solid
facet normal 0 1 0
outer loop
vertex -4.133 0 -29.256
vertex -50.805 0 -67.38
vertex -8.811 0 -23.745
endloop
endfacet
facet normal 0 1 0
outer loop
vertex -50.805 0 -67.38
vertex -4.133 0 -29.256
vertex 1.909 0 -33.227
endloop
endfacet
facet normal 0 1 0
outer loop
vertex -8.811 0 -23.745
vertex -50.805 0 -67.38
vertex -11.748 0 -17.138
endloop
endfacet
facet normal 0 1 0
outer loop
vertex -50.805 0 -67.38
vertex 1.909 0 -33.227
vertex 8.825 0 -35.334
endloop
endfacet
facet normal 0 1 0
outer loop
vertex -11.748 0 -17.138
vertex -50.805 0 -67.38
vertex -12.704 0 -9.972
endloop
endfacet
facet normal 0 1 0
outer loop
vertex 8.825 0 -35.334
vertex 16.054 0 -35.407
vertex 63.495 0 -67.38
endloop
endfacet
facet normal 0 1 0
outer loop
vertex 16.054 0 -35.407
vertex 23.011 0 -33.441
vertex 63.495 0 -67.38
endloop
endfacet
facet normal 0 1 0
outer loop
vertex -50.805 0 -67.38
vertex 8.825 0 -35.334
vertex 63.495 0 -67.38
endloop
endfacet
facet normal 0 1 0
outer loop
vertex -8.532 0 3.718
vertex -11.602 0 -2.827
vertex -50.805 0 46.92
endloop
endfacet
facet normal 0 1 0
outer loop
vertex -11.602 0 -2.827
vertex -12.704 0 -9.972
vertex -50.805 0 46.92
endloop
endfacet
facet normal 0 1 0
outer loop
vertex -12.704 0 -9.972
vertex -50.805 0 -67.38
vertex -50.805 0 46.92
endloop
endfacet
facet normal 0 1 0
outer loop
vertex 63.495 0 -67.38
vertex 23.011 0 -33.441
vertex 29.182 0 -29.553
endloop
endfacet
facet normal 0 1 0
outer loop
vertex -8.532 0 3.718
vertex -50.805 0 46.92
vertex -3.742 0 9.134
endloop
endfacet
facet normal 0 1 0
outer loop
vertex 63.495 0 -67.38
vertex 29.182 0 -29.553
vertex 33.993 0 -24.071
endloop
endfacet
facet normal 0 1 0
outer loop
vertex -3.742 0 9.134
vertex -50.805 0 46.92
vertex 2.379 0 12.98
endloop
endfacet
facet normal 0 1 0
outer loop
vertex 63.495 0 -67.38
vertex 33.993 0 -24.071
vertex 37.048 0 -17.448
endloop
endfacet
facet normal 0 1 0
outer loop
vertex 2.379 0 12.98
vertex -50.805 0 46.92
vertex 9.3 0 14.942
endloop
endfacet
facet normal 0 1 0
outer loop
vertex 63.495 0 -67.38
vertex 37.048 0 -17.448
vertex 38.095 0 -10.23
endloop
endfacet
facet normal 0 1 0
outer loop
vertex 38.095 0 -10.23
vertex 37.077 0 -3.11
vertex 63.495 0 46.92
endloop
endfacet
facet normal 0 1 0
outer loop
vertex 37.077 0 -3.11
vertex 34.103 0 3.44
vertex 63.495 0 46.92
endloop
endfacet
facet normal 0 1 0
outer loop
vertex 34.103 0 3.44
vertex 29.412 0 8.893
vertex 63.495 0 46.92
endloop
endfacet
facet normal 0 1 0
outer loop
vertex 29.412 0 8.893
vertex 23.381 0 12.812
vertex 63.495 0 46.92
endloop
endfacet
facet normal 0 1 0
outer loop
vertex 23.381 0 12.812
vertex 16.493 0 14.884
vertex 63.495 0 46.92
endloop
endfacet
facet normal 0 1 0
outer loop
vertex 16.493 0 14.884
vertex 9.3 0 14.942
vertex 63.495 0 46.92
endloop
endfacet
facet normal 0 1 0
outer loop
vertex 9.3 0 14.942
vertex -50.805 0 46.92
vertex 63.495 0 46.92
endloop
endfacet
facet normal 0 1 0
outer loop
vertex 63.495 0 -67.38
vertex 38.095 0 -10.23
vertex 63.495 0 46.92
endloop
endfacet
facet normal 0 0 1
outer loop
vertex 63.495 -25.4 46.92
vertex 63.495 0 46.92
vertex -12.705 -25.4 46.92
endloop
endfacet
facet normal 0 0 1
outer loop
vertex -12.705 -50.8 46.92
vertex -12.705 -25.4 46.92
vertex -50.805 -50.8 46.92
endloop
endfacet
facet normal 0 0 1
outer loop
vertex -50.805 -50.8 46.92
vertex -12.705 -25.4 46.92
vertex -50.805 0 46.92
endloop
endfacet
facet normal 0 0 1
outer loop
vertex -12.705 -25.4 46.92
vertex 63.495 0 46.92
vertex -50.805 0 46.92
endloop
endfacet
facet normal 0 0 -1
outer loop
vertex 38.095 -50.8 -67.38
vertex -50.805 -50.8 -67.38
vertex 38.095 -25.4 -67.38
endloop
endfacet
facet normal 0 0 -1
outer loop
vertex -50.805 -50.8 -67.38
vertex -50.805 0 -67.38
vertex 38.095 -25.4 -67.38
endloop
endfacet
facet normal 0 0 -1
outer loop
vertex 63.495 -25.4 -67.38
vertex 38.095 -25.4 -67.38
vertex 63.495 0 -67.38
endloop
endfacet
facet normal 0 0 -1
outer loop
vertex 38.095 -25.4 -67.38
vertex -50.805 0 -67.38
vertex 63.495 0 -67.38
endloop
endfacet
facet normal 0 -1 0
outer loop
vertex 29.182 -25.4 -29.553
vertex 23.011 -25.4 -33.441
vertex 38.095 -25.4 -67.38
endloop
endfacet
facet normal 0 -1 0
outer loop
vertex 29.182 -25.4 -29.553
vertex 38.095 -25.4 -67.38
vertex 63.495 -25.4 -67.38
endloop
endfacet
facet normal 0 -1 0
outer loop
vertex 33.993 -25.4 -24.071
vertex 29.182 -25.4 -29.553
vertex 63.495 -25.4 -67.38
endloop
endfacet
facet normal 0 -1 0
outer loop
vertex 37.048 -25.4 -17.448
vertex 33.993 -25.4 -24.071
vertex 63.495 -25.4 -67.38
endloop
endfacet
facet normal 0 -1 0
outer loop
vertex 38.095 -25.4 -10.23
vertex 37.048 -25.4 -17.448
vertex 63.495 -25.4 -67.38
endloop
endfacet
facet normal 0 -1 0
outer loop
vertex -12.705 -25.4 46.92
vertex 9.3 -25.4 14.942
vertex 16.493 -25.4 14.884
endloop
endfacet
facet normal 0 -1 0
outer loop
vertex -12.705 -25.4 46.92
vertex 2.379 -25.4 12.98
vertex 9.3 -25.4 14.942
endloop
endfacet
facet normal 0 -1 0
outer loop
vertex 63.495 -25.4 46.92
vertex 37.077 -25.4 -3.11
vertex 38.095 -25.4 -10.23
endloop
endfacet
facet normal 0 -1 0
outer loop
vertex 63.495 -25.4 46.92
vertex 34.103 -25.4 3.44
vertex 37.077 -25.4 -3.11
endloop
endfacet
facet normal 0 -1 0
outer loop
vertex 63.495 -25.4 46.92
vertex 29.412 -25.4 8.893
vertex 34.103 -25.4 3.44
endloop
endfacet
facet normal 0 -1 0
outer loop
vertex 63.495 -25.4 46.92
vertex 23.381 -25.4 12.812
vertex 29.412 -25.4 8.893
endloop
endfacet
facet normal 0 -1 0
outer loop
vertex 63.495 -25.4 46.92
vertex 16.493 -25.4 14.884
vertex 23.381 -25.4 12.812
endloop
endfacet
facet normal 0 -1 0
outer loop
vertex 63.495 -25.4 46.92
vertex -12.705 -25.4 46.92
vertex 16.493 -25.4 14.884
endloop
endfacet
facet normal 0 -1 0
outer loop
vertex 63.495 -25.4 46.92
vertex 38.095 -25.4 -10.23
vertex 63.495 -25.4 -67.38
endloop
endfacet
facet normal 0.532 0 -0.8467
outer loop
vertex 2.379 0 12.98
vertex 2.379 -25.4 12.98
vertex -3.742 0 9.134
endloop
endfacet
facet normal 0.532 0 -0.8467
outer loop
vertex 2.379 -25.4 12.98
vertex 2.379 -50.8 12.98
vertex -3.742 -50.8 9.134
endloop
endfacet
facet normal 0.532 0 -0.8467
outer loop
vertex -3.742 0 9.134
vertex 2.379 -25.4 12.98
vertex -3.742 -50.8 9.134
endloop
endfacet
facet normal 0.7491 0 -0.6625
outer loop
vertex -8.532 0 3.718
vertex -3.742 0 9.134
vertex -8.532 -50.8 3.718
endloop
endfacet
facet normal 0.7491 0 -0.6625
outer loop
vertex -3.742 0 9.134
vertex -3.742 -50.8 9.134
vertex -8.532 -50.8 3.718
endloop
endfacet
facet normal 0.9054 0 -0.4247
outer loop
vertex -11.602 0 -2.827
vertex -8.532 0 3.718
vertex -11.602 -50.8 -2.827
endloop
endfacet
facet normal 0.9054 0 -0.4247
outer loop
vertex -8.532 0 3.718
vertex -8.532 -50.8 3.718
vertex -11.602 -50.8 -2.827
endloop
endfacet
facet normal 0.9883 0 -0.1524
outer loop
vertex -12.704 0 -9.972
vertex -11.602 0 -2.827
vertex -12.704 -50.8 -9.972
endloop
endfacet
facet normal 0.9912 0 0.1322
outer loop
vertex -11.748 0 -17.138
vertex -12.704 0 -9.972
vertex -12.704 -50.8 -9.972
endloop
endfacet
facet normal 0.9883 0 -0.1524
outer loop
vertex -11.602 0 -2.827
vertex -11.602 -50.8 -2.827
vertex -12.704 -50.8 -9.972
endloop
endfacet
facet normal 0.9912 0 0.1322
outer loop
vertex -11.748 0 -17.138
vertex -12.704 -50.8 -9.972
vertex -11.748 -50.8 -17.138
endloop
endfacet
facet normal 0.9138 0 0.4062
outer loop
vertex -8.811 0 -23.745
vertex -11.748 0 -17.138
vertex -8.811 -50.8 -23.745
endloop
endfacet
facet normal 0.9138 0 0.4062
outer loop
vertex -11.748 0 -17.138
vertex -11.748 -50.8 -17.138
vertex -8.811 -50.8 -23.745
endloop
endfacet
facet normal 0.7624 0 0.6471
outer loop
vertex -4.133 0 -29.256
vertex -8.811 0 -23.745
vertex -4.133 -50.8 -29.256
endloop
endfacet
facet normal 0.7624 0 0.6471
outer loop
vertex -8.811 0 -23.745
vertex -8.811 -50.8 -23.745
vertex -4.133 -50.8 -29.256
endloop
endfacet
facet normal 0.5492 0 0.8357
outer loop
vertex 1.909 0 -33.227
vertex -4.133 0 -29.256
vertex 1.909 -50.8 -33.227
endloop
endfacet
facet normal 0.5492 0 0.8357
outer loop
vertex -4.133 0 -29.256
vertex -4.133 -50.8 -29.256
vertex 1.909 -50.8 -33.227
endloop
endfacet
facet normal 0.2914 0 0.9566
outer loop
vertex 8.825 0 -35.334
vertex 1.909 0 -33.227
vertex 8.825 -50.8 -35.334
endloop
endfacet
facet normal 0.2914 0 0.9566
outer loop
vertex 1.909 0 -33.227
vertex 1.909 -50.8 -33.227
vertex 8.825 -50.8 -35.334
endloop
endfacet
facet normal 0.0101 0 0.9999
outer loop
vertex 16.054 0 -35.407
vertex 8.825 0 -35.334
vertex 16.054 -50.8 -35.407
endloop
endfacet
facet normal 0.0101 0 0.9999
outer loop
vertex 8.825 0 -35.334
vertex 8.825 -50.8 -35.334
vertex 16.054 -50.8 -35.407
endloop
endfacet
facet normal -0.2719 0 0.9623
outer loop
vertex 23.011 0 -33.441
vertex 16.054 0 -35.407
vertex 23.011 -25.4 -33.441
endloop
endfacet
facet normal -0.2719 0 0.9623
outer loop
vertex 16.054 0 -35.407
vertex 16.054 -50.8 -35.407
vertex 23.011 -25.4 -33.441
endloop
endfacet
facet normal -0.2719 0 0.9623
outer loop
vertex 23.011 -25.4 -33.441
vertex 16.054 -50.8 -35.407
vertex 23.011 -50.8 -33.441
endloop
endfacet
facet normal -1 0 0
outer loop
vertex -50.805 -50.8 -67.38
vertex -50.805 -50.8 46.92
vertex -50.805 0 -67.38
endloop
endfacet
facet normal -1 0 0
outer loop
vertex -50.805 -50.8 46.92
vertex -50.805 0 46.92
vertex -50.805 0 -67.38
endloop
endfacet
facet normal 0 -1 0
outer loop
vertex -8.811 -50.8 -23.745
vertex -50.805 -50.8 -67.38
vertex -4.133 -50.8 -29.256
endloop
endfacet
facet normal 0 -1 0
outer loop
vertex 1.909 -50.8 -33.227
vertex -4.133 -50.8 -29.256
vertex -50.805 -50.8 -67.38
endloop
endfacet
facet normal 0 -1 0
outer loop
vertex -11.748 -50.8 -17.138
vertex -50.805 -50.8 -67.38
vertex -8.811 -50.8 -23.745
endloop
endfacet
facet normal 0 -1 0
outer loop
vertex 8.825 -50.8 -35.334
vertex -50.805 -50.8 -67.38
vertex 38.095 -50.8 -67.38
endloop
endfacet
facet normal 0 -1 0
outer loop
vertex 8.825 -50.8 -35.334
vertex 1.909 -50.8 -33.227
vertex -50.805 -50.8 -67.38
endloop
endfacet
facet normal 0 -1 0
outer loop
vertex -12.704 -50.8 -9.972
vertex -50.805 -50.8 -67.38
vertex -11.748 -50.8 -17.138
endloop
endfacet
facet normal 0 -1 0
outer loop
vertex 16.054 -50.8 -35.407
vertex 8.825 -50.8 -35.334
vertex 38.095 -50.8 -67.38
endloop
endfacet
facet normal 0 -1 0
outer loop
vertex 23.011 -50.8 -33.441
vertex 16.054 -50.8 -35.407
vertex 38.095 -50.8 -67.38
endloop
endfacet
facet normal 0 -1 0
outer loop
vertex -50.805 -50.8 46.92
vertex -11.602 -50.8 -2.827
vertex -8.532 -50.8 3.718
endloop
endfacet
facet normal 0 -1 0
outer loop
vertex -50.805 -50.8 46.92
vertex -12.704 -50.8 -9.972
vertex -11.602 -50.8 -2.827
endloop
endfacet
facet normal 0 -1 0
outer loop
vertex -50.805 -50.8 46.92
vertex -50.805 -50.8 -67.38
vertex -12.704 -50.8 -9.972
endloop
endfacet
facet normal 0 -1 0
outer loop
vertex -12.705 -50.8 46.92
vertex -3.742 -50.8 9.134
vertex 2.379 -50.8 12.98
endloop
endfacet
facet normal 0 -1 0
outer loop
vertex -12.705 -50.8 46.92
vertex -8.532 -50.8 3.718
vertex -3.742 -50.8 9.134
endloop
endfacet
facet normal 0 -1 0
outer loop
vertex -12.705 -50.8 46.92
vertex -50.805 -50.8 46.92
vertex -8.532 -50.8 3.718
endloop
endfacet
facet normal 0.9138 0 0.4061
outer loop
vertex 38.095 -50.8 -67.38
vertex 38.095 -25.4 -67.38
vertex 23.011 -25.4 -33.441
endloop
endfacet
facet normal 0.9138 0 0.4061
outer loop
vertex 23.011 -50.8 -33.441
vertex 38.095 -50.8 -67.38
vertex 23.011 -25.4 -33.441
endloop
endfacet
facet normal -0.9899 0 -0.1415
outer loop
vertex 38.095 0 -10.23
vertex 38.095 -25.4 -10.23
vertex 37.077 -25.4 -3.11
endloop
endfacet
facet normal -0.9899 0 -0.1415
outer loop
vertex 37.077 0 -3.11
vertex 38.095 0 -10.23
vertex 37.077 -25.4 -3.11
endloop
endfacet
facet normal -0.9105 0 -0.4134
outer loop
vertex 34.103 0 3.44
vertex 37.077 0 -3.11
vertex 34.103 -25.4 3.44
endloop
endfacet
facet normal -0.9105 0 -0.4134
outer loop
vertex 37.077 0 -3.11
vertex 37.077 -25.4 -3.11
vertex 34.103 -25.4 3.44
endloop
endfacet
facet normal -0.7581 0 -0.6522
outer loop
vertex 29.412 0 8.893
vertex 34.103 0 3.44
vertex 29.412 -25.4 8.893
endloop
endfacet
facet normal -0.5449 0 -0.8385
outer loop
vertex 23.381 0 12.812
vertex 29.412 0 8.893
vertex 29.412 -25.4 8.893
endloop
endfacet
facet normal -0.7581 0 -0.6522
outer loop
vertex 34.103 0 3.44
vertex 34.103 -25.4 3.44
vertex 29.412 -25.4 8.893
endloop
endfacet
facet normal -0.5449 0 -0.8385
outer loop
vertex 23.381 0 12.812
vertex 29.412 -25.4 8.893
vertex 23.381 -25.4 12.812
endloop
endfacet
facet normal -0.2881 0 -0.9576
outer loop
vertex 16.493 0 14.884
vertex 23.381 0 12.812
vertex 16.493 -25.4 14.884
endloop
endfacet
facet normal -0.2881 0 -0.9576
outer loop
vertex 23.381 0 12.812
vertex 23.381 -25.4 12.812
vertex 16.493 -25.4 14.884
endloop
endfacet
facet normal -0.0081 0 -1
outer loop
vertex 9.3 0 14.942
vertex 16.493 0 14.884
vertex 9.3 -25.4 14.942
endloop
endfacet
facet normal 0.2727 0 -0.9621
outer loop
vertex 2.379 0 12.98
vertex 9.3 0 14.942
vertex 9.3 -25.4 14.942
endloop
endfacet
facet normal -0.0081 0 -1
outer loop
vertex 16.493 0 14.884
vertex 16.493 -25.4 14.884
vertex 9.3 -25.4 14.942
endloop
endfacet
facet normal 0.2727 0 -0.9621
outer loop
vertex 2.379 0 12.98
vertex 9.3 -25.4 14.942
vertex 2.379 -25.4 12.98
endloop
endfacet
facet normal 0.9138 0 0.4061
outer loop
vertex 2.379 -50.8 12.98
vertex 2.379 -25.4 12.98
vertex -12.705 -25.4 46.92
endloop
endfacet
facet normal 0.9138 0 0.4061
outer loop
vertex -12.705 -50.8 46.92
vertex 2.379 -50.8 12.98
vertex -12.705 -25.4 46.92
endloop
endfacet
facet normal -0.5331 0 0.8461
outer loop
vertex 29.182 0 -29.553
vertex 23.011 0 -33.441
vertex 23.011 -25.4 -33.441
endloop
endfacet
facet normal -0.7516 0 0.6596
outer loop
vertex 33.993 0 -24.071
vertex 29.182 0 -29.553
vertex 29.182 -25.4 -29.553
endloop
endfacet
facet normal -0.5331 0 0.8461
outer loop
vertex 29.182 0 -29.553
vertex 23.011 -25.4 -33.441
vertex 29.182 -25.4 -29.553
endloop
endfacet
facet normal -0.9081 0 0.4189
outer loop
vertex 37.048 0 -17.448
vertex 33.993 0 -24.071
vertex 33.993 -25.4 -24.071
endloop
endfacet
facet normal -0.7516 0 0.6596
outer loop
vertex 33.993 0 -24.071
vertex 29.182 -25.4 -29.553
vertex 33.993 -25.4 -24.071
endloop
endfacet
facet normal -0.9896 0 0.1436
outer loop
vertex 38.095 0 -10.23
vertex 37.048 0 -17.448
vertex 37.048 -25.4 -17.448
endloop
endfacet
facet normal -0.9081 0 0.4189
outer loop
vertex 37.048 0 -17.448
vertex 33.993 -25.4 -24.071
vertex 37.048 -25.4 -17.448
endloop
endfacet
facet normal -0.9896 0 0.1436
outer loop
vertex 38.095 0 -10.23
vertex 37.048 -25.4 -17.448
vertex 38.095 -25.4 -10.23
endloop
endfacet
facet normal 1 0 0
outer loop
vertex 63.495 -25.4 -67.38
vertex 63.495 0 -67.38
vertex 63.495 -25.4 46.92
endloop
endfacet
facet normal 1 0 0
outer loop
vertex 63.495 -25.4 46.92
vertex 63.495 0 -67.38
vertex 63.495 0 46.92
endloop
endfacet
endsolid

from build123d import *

# Parameters (mm, degrees)
F0_W     = 114.3
F0_H     = 114.3
F1_DEPTH = 25.4
F3_DEPTH = 25.4
F5_DEPTH = 50.801


with BuildPart() as f1:
    # F0 (on Front) → F1 (new body)
    with BuildSketch(Plane.XZ):
        with Locations((6.345086, -10.230491)):
            Rectangle(F0_W, F0_H)
    extrude(amount=F1_DEPTH)

    # F2 (on face) → F3 (join)
    with BuildSketch(Plane.XZ.offset(25.4)):
        Polygon((-12.704914, 46.919509), (-50.804914, 46.919509), (-50.804914, -67.380491), (38.095086, -67.380491), align=None)
    extrude(amount=F3_DEPTH)

    # F4 (on face) → F5 (cut, through all)
    with BuildSketch(Plane.XZ.offset(50.8)):
        with BuildLine():
            Line((23.011003, -33.441305), (2.379169, 12.980322))
            ThreePointArc((2.379169, 12.980322), (-10.515728, -20.546409), (23.011003, -33.441305))
        make_face()
        with BuildLine():
            ThreePointArc((23.011003, -33.441305), (33.992789, -24.071295), (38.095086, -10.230491))
            ThreePointArc((38.095086, -10.230491), (26.53589, 11.067211), (2.379169, 12.980322))
            Line((2.379169, 12.980322), (23.011003, -33.441305))
        make_face()
    extrude(amount=-F5_DEPTH, mode=Mode.SUBTRACT)


solid = f1.part
